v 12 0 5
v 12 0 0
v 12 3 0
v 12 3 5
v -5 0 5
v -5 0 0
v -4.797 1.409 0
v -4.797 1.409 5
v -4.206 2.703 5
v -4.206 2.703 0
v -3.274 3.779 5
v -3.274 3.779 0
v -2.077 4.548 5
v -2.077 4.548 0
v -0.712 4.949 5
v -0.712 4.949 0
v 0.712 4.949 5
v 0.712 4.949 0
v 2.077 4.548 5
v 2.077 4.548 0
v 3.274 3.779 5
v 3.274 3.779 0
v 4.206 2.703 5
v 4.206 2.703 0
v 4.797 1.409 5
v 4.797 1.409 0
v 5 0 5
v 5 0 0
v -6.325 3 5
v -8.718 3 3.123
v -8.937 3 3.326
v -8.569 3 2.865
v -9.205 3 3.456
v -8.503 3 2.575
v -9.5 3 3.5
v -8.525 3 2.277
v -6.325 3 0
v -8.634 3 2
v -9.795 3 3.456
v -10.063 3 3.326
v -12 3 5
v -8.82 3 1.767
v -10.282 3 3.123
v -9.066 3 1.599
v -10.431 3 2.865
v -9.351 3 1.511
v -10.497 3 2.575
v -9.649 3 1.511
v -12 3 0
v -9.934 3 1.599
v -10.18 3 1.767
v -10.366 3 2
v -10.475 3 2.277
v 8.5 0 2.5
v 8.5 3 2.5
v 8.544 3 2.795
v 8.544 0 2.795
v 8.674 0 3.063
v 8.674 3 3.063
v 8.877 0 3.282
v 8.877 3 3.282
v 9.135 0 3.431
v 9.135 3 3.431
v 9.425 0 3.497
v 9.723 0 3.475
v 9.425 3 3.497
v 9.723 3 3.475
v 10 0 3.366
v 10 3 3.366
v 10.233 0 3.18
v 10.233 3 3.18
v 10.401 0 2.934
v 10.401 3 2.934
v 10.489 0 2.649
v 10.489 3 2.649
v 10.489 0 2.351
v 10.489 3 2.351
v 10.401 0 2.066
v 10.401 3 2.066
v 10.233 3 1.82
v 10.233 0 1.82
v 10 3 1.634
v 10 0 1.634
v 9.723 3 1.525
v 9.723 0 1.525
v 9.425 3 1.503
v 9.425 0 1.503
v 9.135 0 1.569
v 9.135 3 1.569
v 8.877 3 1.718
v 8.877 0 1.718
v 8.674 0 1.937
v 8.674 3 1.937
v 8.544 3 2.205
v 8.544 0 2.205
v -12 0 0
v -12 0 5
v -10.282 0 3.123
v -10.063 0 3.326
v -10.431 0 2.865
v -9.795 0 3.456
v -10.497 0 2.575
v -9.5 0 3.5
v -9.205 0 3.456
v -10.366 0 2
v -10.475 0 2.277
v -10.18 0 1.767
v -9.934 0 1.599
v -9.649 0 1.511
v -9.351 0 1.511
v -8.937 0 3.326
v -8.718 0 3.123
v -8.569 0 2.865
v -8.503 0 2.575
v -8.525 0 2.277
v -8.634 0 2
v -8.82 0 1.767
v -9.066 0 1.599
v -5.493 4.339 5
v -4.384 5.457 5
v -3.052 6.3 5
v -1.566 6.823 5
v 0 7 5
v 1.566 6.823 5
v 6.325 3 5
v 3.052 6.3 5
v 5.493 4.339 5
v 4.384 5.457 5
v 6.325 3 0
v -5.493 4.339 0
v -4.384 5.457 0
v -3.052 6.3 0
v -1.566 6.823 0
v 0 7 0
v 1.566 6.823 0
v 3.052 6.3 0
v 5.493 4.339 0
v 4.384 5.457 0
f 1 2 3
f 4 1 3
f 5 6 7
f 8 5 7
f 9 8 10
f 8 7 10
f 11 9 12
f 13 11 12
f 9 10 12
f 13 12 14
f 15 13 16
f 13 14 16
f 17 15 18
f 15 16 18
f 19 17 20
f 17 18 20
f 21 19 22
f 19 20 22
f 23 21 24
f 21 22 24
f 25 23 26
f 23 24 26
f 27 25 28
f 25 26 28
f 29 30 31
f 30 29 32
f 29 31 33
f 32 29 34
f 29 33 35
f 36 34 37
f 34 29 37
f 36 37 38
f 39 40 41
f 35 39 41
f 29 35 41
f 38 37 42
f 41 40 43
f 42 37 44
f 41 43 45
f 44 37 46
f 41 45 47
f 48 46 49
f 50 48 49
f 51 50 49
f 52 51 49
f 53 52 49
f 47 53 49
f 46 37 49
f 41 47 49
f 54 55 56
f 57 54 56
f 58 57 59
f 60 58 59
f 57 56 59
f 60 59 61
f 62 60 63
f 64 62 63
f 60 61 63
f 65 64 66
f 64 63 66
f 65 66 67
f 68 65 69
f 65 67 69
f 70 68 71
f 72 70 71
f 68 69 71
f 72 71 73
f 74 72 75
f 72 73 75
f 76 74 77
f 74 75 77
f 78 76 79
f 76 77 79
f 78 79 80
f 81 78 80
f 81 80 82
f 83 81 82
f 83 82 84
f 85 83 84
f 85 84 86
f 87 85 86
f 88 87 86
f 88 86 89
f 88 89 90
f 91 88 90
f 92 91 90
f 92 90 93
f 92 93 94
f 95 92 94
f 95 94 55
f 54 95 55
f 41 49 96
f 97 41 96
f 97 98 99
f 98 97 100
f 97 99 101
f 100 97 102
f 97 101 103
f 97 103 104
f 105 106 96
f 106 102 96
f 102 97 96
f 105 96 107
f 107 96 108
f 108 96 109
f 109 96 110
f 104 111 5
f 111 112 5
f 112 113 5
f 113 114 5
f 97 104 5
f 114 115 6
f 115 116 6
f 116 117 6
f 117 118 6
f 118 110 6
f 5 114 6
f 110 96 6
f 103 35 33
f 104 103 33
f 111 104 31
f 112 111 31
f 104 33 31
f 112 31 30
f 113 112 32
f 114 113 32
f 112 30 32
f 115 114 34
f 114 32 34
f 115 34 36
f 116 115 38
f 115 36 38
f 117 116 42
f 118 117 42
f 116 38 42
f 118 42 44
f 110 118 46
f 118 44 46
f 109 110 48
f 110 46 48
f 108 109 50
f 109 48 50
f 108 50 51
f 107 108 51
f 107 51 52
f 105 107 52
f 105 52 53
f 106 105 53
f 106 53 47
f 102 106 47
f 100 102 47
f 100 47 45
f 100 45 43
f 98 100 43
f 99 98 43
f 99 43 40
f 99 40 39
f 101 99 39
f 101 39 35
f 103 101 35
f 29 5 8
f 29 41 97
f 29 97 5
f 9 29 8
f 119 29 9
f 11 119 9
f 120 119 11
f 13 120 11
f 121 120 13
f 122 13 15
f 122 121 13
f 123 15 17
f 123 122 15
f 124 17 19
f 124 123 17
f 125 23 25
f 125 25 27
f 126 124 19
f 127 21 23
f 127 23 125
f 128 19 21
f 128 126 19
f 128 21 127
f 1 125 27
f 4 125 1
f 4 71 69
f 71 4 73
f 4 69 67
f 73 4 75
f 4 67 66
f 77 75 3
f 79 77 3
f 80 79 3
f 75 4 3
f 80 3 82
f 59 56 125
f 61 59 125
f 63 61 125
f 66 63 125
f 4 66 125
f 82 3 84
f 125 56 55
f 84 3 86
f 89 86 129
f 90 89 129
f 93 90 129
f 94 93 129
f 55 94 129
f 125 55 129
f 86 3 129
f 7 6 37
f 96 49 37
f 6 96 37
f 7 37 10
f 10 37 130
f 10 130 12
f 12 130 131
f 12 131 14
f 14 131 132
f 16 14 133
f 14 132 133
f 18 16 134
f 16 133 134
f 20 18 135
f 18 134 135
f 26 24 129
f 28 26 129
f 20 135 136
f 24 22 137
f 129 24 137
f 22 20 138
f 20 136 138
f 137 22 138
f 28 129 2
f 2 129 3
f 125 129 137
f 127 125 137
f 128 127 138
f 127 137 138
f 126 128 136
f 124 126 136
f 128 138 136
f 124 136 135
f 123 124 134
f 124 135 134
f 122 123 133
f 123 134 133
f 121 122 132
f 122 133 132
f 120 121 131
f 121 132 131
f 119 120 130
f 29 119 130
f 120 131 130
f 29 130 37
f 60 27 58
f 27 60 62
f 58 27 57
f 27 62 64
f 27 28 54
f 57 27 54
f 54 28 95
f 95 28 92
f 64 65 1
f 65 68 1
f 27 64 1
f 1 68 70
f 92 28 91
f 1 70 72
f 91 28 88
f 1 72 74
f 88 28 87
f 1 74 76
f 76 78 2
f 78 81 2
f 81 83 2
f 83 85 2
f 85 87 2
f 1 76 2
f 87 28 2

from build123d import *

# Parameters (mm, degrees)
BOSS_EXTRUDE1_DEPTH = 5
SKETCH2_R           = 1
CUT_EXTRUDE1_DEPTH  = 5


with BuildPart() as part:
    # Sketch1 → Boss-Extrude1 (new body)
    with BuildSketch(Plane.XY):
        with BuildLine():
            Line((-7, 0), (-5, 0))
            ThreePointArc((-5, 0), (0, 5), (5, 0))
            Line((5, 0), (7, 0))
            Line((7, 0), (12, 0))
            Line((12, 0), (12, 3))
            Line((12, 3), (6.32455532, 3))
            ThreePointArc((6.32455532, 3), (0, 7), (-6.32455532, 3))
            Line((-6.32455532, 3), (-12, 3))
            Line((-12, 3), (-12, 0))
            Line((-12, 0), (-7, 0))
        make_face()
    extrude(amount=BOSS_EXTRUDE1_DEPTH)

    # Sketch2 → Cut-Extrude1 (cut)
    with BuildSketch(Plane(origin=(0, 3, 0), x_dir=(1, 0, 0), z_dir=(0, 1, 0))):
        with Locations(Location((-9.5, -2.5, 0), (0, 0, 270))):
            Circle(SKETCH2_R)
        with Locations(Location((9.5, -2.5, 0), (0, 0, 180))):
            Circle(SKETCH2_R)
    extrude(amount=-CUT_EXTRUDE1_DEPTH, mode=Mode.SUBTRACT)


solid = part.part
